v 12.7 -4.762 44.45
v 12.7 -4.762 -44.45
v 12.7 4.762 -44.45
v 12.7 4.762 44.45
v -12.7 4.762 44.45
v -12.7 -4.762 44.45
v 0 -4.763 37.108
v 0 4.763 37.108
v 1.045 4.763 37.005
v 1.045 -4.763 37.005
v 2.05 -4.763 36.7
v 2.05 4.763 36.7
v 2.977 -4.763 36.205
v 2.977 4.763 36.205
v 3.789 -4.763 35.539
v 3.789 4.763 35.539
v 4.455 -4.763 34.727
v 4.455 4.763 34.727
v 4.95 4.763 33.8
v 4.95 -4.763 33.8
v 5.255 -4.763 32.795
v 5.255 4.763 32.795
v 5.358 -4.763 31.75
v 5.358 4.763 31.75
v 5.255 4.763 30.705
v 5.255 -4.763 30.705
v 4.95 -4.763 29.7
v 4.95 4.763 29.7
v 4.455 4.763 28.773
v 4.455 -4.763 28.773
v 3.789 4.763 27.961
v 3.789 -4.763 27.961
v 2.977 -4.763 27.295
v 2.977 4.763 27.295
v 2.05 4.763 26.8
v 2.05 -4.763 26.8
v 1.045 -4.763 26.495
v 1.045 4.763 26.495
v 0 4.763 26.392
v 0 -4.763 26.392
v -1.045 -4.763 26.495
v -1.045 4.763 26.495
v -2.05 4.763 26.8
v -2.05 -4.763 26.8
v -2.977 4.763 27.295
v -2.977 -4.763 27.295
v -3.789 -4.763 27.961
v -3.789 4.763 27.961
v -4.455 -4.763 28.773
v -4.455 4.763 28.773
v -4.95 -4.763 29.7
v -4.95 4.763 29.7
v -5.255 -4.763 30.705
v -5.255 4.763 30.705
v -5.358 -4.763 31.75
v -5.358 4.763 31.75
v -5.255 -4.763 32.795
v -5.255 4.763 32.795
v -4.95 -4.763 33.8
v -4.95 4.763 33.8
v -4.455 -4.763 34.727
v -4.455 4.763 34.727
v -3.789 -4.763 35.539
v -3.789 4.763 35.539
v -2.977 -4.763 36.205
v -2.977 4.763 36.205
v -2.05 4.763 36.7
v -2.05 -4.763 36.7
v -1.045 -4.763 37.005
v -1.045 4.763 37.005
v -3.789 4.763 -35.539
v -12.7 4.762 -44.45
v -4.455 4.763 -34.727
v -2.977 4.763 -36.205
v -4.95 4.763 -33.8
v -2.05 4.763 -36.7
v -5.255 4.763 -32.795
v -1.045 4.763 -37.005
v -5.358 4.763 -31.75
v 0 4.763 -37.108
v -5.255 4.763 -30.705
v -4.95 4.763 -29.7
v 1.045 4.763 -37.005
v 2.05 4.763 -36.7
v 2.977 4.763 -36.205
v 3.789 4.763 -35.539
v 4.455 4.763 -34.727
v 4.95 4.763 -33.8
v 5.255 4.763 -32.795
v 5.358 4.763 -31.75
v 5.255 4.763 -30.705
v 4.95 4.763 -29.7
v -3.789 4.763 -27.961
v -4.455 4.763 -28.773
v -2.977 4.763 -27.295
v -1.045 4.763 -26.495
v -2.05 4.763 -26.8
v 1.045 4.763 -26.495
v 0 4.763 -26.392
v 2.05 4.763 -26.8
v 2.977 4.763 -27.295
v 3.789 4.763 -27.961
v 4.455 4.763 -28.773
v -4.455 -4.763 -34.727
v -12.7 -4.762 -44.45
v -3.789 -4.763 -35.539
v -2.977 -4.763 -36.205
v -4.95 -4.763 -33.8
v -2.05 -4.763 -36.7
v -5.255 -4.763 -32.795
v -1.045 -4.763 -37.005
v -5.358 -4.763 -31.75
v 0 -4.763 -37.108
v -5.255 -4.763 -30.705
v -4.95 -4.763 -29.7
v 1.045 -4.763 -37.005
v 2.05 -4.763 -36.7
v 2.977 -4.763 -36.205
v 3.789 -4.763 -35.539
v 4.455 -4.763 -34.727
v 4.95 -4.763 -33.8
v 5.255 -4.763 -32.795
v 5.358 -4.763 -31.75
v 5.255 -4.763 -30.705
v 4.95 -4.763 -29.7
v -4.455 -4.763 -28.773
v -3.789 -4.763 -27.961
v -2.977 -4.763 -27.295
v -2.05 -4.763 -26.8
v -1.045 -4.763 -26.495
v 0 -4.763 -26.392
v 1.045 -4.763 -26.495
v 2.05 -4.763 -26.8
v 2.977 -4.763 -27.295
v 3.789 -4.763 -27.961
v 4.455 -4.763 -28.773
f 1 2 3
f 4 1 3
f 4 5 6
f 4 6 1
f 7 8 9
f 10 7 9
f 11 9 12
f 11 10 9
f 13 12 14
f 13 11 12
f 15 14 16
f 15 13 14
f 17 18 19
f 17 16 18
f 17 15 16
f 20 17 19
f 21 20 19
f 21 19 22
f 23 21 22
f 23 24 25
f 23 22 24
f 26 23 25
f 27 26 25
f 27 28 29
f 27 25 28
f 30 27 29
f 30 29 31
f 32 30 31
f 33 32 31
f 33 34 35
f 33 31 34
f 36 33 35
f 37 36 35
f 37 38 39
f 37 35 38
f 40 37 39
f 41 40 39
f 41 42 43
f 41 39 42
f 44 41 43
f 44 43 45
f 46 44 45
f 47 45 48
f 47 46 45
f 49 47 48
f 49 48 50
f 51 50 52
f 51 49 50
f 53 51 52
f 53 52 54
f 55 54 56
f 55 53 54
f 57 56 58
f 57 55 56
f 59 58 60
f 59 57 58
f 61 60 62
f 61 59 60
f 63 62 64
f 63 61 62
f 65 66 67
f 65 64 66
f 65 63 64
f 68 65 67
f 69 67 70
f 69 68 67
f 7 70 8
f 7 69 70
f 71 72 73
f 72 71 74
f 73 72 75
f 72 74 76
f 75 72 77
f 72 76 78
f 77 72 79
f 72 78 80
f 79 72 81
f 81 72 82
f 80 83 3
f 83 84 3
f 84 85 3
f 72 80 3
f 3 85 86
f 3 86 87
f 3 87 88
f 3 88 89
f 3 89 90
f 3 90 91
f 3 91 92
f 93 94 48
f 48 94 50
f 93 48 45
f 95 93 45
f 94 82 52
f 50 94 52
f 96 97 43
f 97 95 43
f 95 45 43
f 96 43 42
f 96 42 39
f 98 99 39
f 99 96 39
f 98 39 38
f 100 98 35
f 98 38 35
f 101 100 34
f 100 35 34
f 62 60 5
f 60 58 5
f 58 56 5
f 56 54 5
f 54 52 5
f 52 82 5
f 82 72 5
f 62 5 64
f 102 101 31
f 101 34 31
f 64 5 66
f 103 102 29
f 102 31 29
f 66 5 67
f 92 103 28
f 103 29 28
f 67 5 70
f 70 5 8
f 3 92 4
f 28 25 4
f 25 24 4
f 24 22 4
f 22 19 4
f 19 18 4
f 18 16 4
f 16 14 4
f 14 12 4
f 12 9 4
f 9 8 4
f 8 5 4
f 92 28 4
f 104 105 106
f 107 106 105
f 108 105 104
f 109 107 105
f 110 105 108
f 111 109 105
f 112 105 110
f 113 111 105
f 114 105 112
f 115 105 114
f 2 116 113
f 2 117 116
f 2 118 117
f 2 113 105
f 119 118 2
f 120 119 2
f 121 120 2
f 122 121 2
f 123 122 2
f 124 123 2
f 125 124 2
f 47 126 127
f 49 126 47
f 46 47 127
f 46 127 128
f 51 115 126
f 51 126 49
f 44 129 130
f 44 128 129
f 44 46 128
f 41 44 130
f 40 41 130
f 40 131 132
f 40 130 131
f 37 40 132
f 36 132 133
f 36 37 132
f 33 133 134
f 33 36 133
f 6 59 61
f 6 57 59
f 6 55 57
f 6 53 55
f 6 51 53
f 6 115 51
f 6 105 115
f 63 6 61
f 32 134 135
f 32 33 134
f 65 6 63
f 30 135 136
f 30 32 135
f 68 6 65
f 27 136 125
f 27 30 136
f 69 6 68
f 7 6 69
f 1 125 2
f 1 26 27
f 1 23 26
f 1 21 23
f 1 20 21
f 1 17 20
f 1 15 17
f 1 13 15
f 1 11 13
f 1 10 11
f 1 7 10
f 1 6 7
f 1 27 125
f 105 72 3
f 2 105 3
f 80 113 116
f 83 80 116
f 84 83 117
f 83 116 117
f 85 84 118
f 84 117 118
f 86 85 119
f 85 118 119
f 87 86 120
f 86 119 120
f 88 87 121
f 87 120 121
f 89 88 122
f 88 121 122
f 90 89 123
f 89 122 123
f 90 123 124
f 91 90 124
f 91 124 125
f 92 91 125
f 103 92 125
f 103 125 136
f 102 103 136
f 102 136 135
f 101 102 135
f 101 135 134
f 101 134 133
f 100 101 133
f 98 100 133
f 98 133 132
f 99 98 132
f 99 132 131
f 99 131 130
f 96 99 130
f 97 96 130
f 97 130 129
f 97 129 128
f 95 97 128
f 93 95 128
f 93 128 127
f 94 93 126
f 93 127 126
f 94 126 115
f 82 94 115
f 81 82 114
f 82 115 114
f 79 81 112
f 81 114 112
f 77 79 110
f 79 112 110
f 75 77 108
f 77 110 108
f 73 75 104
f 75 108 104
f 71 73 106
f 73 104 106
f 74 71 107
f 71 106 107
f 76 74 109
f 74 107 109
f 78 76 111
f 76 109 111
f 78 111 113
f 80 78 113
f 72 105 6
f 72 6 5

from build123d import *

# Parameters (mm, degrees)
SKETCH1_W                   = 25.4
SKETCH1_H                   = 9.525
EXTRUDE1_DEPTH              = 44.45
TAP_DRILL_FOR_1_2_13_TAP1_D = 10.71626


with BuildPart() as part:
    # Sketch1 → Extrude1 (new body, symmetric)
    with BuildSketch(Plane.XY):
        Rectangle(SKETCH1_W, SKETCH1_H)
    extrude(amount=EXTRUDE1_DEPTH, both=True)

    # Tap Drill for 1/2-13 Tap1 (through all)
    with Locations(Plane(origin=(0, 4.7625, -31.75), x_dir=(0, 0, 1), z_dir=(0, 1, 0))):
        with Locations((0, 0)):
            tap_drill_for_1_2_13_tap1 = Hole(TAP_DRILL_FOR_1_2_13_TAP1_D / 2)

    # Mirror1: Tap Drill for 1/2-13 Tap1 across plane
    add(tap_drill_for_1_2_13_tap1.mirror(Plane.XY), mode=Mode.SUBTRACT)


solid = part.part
